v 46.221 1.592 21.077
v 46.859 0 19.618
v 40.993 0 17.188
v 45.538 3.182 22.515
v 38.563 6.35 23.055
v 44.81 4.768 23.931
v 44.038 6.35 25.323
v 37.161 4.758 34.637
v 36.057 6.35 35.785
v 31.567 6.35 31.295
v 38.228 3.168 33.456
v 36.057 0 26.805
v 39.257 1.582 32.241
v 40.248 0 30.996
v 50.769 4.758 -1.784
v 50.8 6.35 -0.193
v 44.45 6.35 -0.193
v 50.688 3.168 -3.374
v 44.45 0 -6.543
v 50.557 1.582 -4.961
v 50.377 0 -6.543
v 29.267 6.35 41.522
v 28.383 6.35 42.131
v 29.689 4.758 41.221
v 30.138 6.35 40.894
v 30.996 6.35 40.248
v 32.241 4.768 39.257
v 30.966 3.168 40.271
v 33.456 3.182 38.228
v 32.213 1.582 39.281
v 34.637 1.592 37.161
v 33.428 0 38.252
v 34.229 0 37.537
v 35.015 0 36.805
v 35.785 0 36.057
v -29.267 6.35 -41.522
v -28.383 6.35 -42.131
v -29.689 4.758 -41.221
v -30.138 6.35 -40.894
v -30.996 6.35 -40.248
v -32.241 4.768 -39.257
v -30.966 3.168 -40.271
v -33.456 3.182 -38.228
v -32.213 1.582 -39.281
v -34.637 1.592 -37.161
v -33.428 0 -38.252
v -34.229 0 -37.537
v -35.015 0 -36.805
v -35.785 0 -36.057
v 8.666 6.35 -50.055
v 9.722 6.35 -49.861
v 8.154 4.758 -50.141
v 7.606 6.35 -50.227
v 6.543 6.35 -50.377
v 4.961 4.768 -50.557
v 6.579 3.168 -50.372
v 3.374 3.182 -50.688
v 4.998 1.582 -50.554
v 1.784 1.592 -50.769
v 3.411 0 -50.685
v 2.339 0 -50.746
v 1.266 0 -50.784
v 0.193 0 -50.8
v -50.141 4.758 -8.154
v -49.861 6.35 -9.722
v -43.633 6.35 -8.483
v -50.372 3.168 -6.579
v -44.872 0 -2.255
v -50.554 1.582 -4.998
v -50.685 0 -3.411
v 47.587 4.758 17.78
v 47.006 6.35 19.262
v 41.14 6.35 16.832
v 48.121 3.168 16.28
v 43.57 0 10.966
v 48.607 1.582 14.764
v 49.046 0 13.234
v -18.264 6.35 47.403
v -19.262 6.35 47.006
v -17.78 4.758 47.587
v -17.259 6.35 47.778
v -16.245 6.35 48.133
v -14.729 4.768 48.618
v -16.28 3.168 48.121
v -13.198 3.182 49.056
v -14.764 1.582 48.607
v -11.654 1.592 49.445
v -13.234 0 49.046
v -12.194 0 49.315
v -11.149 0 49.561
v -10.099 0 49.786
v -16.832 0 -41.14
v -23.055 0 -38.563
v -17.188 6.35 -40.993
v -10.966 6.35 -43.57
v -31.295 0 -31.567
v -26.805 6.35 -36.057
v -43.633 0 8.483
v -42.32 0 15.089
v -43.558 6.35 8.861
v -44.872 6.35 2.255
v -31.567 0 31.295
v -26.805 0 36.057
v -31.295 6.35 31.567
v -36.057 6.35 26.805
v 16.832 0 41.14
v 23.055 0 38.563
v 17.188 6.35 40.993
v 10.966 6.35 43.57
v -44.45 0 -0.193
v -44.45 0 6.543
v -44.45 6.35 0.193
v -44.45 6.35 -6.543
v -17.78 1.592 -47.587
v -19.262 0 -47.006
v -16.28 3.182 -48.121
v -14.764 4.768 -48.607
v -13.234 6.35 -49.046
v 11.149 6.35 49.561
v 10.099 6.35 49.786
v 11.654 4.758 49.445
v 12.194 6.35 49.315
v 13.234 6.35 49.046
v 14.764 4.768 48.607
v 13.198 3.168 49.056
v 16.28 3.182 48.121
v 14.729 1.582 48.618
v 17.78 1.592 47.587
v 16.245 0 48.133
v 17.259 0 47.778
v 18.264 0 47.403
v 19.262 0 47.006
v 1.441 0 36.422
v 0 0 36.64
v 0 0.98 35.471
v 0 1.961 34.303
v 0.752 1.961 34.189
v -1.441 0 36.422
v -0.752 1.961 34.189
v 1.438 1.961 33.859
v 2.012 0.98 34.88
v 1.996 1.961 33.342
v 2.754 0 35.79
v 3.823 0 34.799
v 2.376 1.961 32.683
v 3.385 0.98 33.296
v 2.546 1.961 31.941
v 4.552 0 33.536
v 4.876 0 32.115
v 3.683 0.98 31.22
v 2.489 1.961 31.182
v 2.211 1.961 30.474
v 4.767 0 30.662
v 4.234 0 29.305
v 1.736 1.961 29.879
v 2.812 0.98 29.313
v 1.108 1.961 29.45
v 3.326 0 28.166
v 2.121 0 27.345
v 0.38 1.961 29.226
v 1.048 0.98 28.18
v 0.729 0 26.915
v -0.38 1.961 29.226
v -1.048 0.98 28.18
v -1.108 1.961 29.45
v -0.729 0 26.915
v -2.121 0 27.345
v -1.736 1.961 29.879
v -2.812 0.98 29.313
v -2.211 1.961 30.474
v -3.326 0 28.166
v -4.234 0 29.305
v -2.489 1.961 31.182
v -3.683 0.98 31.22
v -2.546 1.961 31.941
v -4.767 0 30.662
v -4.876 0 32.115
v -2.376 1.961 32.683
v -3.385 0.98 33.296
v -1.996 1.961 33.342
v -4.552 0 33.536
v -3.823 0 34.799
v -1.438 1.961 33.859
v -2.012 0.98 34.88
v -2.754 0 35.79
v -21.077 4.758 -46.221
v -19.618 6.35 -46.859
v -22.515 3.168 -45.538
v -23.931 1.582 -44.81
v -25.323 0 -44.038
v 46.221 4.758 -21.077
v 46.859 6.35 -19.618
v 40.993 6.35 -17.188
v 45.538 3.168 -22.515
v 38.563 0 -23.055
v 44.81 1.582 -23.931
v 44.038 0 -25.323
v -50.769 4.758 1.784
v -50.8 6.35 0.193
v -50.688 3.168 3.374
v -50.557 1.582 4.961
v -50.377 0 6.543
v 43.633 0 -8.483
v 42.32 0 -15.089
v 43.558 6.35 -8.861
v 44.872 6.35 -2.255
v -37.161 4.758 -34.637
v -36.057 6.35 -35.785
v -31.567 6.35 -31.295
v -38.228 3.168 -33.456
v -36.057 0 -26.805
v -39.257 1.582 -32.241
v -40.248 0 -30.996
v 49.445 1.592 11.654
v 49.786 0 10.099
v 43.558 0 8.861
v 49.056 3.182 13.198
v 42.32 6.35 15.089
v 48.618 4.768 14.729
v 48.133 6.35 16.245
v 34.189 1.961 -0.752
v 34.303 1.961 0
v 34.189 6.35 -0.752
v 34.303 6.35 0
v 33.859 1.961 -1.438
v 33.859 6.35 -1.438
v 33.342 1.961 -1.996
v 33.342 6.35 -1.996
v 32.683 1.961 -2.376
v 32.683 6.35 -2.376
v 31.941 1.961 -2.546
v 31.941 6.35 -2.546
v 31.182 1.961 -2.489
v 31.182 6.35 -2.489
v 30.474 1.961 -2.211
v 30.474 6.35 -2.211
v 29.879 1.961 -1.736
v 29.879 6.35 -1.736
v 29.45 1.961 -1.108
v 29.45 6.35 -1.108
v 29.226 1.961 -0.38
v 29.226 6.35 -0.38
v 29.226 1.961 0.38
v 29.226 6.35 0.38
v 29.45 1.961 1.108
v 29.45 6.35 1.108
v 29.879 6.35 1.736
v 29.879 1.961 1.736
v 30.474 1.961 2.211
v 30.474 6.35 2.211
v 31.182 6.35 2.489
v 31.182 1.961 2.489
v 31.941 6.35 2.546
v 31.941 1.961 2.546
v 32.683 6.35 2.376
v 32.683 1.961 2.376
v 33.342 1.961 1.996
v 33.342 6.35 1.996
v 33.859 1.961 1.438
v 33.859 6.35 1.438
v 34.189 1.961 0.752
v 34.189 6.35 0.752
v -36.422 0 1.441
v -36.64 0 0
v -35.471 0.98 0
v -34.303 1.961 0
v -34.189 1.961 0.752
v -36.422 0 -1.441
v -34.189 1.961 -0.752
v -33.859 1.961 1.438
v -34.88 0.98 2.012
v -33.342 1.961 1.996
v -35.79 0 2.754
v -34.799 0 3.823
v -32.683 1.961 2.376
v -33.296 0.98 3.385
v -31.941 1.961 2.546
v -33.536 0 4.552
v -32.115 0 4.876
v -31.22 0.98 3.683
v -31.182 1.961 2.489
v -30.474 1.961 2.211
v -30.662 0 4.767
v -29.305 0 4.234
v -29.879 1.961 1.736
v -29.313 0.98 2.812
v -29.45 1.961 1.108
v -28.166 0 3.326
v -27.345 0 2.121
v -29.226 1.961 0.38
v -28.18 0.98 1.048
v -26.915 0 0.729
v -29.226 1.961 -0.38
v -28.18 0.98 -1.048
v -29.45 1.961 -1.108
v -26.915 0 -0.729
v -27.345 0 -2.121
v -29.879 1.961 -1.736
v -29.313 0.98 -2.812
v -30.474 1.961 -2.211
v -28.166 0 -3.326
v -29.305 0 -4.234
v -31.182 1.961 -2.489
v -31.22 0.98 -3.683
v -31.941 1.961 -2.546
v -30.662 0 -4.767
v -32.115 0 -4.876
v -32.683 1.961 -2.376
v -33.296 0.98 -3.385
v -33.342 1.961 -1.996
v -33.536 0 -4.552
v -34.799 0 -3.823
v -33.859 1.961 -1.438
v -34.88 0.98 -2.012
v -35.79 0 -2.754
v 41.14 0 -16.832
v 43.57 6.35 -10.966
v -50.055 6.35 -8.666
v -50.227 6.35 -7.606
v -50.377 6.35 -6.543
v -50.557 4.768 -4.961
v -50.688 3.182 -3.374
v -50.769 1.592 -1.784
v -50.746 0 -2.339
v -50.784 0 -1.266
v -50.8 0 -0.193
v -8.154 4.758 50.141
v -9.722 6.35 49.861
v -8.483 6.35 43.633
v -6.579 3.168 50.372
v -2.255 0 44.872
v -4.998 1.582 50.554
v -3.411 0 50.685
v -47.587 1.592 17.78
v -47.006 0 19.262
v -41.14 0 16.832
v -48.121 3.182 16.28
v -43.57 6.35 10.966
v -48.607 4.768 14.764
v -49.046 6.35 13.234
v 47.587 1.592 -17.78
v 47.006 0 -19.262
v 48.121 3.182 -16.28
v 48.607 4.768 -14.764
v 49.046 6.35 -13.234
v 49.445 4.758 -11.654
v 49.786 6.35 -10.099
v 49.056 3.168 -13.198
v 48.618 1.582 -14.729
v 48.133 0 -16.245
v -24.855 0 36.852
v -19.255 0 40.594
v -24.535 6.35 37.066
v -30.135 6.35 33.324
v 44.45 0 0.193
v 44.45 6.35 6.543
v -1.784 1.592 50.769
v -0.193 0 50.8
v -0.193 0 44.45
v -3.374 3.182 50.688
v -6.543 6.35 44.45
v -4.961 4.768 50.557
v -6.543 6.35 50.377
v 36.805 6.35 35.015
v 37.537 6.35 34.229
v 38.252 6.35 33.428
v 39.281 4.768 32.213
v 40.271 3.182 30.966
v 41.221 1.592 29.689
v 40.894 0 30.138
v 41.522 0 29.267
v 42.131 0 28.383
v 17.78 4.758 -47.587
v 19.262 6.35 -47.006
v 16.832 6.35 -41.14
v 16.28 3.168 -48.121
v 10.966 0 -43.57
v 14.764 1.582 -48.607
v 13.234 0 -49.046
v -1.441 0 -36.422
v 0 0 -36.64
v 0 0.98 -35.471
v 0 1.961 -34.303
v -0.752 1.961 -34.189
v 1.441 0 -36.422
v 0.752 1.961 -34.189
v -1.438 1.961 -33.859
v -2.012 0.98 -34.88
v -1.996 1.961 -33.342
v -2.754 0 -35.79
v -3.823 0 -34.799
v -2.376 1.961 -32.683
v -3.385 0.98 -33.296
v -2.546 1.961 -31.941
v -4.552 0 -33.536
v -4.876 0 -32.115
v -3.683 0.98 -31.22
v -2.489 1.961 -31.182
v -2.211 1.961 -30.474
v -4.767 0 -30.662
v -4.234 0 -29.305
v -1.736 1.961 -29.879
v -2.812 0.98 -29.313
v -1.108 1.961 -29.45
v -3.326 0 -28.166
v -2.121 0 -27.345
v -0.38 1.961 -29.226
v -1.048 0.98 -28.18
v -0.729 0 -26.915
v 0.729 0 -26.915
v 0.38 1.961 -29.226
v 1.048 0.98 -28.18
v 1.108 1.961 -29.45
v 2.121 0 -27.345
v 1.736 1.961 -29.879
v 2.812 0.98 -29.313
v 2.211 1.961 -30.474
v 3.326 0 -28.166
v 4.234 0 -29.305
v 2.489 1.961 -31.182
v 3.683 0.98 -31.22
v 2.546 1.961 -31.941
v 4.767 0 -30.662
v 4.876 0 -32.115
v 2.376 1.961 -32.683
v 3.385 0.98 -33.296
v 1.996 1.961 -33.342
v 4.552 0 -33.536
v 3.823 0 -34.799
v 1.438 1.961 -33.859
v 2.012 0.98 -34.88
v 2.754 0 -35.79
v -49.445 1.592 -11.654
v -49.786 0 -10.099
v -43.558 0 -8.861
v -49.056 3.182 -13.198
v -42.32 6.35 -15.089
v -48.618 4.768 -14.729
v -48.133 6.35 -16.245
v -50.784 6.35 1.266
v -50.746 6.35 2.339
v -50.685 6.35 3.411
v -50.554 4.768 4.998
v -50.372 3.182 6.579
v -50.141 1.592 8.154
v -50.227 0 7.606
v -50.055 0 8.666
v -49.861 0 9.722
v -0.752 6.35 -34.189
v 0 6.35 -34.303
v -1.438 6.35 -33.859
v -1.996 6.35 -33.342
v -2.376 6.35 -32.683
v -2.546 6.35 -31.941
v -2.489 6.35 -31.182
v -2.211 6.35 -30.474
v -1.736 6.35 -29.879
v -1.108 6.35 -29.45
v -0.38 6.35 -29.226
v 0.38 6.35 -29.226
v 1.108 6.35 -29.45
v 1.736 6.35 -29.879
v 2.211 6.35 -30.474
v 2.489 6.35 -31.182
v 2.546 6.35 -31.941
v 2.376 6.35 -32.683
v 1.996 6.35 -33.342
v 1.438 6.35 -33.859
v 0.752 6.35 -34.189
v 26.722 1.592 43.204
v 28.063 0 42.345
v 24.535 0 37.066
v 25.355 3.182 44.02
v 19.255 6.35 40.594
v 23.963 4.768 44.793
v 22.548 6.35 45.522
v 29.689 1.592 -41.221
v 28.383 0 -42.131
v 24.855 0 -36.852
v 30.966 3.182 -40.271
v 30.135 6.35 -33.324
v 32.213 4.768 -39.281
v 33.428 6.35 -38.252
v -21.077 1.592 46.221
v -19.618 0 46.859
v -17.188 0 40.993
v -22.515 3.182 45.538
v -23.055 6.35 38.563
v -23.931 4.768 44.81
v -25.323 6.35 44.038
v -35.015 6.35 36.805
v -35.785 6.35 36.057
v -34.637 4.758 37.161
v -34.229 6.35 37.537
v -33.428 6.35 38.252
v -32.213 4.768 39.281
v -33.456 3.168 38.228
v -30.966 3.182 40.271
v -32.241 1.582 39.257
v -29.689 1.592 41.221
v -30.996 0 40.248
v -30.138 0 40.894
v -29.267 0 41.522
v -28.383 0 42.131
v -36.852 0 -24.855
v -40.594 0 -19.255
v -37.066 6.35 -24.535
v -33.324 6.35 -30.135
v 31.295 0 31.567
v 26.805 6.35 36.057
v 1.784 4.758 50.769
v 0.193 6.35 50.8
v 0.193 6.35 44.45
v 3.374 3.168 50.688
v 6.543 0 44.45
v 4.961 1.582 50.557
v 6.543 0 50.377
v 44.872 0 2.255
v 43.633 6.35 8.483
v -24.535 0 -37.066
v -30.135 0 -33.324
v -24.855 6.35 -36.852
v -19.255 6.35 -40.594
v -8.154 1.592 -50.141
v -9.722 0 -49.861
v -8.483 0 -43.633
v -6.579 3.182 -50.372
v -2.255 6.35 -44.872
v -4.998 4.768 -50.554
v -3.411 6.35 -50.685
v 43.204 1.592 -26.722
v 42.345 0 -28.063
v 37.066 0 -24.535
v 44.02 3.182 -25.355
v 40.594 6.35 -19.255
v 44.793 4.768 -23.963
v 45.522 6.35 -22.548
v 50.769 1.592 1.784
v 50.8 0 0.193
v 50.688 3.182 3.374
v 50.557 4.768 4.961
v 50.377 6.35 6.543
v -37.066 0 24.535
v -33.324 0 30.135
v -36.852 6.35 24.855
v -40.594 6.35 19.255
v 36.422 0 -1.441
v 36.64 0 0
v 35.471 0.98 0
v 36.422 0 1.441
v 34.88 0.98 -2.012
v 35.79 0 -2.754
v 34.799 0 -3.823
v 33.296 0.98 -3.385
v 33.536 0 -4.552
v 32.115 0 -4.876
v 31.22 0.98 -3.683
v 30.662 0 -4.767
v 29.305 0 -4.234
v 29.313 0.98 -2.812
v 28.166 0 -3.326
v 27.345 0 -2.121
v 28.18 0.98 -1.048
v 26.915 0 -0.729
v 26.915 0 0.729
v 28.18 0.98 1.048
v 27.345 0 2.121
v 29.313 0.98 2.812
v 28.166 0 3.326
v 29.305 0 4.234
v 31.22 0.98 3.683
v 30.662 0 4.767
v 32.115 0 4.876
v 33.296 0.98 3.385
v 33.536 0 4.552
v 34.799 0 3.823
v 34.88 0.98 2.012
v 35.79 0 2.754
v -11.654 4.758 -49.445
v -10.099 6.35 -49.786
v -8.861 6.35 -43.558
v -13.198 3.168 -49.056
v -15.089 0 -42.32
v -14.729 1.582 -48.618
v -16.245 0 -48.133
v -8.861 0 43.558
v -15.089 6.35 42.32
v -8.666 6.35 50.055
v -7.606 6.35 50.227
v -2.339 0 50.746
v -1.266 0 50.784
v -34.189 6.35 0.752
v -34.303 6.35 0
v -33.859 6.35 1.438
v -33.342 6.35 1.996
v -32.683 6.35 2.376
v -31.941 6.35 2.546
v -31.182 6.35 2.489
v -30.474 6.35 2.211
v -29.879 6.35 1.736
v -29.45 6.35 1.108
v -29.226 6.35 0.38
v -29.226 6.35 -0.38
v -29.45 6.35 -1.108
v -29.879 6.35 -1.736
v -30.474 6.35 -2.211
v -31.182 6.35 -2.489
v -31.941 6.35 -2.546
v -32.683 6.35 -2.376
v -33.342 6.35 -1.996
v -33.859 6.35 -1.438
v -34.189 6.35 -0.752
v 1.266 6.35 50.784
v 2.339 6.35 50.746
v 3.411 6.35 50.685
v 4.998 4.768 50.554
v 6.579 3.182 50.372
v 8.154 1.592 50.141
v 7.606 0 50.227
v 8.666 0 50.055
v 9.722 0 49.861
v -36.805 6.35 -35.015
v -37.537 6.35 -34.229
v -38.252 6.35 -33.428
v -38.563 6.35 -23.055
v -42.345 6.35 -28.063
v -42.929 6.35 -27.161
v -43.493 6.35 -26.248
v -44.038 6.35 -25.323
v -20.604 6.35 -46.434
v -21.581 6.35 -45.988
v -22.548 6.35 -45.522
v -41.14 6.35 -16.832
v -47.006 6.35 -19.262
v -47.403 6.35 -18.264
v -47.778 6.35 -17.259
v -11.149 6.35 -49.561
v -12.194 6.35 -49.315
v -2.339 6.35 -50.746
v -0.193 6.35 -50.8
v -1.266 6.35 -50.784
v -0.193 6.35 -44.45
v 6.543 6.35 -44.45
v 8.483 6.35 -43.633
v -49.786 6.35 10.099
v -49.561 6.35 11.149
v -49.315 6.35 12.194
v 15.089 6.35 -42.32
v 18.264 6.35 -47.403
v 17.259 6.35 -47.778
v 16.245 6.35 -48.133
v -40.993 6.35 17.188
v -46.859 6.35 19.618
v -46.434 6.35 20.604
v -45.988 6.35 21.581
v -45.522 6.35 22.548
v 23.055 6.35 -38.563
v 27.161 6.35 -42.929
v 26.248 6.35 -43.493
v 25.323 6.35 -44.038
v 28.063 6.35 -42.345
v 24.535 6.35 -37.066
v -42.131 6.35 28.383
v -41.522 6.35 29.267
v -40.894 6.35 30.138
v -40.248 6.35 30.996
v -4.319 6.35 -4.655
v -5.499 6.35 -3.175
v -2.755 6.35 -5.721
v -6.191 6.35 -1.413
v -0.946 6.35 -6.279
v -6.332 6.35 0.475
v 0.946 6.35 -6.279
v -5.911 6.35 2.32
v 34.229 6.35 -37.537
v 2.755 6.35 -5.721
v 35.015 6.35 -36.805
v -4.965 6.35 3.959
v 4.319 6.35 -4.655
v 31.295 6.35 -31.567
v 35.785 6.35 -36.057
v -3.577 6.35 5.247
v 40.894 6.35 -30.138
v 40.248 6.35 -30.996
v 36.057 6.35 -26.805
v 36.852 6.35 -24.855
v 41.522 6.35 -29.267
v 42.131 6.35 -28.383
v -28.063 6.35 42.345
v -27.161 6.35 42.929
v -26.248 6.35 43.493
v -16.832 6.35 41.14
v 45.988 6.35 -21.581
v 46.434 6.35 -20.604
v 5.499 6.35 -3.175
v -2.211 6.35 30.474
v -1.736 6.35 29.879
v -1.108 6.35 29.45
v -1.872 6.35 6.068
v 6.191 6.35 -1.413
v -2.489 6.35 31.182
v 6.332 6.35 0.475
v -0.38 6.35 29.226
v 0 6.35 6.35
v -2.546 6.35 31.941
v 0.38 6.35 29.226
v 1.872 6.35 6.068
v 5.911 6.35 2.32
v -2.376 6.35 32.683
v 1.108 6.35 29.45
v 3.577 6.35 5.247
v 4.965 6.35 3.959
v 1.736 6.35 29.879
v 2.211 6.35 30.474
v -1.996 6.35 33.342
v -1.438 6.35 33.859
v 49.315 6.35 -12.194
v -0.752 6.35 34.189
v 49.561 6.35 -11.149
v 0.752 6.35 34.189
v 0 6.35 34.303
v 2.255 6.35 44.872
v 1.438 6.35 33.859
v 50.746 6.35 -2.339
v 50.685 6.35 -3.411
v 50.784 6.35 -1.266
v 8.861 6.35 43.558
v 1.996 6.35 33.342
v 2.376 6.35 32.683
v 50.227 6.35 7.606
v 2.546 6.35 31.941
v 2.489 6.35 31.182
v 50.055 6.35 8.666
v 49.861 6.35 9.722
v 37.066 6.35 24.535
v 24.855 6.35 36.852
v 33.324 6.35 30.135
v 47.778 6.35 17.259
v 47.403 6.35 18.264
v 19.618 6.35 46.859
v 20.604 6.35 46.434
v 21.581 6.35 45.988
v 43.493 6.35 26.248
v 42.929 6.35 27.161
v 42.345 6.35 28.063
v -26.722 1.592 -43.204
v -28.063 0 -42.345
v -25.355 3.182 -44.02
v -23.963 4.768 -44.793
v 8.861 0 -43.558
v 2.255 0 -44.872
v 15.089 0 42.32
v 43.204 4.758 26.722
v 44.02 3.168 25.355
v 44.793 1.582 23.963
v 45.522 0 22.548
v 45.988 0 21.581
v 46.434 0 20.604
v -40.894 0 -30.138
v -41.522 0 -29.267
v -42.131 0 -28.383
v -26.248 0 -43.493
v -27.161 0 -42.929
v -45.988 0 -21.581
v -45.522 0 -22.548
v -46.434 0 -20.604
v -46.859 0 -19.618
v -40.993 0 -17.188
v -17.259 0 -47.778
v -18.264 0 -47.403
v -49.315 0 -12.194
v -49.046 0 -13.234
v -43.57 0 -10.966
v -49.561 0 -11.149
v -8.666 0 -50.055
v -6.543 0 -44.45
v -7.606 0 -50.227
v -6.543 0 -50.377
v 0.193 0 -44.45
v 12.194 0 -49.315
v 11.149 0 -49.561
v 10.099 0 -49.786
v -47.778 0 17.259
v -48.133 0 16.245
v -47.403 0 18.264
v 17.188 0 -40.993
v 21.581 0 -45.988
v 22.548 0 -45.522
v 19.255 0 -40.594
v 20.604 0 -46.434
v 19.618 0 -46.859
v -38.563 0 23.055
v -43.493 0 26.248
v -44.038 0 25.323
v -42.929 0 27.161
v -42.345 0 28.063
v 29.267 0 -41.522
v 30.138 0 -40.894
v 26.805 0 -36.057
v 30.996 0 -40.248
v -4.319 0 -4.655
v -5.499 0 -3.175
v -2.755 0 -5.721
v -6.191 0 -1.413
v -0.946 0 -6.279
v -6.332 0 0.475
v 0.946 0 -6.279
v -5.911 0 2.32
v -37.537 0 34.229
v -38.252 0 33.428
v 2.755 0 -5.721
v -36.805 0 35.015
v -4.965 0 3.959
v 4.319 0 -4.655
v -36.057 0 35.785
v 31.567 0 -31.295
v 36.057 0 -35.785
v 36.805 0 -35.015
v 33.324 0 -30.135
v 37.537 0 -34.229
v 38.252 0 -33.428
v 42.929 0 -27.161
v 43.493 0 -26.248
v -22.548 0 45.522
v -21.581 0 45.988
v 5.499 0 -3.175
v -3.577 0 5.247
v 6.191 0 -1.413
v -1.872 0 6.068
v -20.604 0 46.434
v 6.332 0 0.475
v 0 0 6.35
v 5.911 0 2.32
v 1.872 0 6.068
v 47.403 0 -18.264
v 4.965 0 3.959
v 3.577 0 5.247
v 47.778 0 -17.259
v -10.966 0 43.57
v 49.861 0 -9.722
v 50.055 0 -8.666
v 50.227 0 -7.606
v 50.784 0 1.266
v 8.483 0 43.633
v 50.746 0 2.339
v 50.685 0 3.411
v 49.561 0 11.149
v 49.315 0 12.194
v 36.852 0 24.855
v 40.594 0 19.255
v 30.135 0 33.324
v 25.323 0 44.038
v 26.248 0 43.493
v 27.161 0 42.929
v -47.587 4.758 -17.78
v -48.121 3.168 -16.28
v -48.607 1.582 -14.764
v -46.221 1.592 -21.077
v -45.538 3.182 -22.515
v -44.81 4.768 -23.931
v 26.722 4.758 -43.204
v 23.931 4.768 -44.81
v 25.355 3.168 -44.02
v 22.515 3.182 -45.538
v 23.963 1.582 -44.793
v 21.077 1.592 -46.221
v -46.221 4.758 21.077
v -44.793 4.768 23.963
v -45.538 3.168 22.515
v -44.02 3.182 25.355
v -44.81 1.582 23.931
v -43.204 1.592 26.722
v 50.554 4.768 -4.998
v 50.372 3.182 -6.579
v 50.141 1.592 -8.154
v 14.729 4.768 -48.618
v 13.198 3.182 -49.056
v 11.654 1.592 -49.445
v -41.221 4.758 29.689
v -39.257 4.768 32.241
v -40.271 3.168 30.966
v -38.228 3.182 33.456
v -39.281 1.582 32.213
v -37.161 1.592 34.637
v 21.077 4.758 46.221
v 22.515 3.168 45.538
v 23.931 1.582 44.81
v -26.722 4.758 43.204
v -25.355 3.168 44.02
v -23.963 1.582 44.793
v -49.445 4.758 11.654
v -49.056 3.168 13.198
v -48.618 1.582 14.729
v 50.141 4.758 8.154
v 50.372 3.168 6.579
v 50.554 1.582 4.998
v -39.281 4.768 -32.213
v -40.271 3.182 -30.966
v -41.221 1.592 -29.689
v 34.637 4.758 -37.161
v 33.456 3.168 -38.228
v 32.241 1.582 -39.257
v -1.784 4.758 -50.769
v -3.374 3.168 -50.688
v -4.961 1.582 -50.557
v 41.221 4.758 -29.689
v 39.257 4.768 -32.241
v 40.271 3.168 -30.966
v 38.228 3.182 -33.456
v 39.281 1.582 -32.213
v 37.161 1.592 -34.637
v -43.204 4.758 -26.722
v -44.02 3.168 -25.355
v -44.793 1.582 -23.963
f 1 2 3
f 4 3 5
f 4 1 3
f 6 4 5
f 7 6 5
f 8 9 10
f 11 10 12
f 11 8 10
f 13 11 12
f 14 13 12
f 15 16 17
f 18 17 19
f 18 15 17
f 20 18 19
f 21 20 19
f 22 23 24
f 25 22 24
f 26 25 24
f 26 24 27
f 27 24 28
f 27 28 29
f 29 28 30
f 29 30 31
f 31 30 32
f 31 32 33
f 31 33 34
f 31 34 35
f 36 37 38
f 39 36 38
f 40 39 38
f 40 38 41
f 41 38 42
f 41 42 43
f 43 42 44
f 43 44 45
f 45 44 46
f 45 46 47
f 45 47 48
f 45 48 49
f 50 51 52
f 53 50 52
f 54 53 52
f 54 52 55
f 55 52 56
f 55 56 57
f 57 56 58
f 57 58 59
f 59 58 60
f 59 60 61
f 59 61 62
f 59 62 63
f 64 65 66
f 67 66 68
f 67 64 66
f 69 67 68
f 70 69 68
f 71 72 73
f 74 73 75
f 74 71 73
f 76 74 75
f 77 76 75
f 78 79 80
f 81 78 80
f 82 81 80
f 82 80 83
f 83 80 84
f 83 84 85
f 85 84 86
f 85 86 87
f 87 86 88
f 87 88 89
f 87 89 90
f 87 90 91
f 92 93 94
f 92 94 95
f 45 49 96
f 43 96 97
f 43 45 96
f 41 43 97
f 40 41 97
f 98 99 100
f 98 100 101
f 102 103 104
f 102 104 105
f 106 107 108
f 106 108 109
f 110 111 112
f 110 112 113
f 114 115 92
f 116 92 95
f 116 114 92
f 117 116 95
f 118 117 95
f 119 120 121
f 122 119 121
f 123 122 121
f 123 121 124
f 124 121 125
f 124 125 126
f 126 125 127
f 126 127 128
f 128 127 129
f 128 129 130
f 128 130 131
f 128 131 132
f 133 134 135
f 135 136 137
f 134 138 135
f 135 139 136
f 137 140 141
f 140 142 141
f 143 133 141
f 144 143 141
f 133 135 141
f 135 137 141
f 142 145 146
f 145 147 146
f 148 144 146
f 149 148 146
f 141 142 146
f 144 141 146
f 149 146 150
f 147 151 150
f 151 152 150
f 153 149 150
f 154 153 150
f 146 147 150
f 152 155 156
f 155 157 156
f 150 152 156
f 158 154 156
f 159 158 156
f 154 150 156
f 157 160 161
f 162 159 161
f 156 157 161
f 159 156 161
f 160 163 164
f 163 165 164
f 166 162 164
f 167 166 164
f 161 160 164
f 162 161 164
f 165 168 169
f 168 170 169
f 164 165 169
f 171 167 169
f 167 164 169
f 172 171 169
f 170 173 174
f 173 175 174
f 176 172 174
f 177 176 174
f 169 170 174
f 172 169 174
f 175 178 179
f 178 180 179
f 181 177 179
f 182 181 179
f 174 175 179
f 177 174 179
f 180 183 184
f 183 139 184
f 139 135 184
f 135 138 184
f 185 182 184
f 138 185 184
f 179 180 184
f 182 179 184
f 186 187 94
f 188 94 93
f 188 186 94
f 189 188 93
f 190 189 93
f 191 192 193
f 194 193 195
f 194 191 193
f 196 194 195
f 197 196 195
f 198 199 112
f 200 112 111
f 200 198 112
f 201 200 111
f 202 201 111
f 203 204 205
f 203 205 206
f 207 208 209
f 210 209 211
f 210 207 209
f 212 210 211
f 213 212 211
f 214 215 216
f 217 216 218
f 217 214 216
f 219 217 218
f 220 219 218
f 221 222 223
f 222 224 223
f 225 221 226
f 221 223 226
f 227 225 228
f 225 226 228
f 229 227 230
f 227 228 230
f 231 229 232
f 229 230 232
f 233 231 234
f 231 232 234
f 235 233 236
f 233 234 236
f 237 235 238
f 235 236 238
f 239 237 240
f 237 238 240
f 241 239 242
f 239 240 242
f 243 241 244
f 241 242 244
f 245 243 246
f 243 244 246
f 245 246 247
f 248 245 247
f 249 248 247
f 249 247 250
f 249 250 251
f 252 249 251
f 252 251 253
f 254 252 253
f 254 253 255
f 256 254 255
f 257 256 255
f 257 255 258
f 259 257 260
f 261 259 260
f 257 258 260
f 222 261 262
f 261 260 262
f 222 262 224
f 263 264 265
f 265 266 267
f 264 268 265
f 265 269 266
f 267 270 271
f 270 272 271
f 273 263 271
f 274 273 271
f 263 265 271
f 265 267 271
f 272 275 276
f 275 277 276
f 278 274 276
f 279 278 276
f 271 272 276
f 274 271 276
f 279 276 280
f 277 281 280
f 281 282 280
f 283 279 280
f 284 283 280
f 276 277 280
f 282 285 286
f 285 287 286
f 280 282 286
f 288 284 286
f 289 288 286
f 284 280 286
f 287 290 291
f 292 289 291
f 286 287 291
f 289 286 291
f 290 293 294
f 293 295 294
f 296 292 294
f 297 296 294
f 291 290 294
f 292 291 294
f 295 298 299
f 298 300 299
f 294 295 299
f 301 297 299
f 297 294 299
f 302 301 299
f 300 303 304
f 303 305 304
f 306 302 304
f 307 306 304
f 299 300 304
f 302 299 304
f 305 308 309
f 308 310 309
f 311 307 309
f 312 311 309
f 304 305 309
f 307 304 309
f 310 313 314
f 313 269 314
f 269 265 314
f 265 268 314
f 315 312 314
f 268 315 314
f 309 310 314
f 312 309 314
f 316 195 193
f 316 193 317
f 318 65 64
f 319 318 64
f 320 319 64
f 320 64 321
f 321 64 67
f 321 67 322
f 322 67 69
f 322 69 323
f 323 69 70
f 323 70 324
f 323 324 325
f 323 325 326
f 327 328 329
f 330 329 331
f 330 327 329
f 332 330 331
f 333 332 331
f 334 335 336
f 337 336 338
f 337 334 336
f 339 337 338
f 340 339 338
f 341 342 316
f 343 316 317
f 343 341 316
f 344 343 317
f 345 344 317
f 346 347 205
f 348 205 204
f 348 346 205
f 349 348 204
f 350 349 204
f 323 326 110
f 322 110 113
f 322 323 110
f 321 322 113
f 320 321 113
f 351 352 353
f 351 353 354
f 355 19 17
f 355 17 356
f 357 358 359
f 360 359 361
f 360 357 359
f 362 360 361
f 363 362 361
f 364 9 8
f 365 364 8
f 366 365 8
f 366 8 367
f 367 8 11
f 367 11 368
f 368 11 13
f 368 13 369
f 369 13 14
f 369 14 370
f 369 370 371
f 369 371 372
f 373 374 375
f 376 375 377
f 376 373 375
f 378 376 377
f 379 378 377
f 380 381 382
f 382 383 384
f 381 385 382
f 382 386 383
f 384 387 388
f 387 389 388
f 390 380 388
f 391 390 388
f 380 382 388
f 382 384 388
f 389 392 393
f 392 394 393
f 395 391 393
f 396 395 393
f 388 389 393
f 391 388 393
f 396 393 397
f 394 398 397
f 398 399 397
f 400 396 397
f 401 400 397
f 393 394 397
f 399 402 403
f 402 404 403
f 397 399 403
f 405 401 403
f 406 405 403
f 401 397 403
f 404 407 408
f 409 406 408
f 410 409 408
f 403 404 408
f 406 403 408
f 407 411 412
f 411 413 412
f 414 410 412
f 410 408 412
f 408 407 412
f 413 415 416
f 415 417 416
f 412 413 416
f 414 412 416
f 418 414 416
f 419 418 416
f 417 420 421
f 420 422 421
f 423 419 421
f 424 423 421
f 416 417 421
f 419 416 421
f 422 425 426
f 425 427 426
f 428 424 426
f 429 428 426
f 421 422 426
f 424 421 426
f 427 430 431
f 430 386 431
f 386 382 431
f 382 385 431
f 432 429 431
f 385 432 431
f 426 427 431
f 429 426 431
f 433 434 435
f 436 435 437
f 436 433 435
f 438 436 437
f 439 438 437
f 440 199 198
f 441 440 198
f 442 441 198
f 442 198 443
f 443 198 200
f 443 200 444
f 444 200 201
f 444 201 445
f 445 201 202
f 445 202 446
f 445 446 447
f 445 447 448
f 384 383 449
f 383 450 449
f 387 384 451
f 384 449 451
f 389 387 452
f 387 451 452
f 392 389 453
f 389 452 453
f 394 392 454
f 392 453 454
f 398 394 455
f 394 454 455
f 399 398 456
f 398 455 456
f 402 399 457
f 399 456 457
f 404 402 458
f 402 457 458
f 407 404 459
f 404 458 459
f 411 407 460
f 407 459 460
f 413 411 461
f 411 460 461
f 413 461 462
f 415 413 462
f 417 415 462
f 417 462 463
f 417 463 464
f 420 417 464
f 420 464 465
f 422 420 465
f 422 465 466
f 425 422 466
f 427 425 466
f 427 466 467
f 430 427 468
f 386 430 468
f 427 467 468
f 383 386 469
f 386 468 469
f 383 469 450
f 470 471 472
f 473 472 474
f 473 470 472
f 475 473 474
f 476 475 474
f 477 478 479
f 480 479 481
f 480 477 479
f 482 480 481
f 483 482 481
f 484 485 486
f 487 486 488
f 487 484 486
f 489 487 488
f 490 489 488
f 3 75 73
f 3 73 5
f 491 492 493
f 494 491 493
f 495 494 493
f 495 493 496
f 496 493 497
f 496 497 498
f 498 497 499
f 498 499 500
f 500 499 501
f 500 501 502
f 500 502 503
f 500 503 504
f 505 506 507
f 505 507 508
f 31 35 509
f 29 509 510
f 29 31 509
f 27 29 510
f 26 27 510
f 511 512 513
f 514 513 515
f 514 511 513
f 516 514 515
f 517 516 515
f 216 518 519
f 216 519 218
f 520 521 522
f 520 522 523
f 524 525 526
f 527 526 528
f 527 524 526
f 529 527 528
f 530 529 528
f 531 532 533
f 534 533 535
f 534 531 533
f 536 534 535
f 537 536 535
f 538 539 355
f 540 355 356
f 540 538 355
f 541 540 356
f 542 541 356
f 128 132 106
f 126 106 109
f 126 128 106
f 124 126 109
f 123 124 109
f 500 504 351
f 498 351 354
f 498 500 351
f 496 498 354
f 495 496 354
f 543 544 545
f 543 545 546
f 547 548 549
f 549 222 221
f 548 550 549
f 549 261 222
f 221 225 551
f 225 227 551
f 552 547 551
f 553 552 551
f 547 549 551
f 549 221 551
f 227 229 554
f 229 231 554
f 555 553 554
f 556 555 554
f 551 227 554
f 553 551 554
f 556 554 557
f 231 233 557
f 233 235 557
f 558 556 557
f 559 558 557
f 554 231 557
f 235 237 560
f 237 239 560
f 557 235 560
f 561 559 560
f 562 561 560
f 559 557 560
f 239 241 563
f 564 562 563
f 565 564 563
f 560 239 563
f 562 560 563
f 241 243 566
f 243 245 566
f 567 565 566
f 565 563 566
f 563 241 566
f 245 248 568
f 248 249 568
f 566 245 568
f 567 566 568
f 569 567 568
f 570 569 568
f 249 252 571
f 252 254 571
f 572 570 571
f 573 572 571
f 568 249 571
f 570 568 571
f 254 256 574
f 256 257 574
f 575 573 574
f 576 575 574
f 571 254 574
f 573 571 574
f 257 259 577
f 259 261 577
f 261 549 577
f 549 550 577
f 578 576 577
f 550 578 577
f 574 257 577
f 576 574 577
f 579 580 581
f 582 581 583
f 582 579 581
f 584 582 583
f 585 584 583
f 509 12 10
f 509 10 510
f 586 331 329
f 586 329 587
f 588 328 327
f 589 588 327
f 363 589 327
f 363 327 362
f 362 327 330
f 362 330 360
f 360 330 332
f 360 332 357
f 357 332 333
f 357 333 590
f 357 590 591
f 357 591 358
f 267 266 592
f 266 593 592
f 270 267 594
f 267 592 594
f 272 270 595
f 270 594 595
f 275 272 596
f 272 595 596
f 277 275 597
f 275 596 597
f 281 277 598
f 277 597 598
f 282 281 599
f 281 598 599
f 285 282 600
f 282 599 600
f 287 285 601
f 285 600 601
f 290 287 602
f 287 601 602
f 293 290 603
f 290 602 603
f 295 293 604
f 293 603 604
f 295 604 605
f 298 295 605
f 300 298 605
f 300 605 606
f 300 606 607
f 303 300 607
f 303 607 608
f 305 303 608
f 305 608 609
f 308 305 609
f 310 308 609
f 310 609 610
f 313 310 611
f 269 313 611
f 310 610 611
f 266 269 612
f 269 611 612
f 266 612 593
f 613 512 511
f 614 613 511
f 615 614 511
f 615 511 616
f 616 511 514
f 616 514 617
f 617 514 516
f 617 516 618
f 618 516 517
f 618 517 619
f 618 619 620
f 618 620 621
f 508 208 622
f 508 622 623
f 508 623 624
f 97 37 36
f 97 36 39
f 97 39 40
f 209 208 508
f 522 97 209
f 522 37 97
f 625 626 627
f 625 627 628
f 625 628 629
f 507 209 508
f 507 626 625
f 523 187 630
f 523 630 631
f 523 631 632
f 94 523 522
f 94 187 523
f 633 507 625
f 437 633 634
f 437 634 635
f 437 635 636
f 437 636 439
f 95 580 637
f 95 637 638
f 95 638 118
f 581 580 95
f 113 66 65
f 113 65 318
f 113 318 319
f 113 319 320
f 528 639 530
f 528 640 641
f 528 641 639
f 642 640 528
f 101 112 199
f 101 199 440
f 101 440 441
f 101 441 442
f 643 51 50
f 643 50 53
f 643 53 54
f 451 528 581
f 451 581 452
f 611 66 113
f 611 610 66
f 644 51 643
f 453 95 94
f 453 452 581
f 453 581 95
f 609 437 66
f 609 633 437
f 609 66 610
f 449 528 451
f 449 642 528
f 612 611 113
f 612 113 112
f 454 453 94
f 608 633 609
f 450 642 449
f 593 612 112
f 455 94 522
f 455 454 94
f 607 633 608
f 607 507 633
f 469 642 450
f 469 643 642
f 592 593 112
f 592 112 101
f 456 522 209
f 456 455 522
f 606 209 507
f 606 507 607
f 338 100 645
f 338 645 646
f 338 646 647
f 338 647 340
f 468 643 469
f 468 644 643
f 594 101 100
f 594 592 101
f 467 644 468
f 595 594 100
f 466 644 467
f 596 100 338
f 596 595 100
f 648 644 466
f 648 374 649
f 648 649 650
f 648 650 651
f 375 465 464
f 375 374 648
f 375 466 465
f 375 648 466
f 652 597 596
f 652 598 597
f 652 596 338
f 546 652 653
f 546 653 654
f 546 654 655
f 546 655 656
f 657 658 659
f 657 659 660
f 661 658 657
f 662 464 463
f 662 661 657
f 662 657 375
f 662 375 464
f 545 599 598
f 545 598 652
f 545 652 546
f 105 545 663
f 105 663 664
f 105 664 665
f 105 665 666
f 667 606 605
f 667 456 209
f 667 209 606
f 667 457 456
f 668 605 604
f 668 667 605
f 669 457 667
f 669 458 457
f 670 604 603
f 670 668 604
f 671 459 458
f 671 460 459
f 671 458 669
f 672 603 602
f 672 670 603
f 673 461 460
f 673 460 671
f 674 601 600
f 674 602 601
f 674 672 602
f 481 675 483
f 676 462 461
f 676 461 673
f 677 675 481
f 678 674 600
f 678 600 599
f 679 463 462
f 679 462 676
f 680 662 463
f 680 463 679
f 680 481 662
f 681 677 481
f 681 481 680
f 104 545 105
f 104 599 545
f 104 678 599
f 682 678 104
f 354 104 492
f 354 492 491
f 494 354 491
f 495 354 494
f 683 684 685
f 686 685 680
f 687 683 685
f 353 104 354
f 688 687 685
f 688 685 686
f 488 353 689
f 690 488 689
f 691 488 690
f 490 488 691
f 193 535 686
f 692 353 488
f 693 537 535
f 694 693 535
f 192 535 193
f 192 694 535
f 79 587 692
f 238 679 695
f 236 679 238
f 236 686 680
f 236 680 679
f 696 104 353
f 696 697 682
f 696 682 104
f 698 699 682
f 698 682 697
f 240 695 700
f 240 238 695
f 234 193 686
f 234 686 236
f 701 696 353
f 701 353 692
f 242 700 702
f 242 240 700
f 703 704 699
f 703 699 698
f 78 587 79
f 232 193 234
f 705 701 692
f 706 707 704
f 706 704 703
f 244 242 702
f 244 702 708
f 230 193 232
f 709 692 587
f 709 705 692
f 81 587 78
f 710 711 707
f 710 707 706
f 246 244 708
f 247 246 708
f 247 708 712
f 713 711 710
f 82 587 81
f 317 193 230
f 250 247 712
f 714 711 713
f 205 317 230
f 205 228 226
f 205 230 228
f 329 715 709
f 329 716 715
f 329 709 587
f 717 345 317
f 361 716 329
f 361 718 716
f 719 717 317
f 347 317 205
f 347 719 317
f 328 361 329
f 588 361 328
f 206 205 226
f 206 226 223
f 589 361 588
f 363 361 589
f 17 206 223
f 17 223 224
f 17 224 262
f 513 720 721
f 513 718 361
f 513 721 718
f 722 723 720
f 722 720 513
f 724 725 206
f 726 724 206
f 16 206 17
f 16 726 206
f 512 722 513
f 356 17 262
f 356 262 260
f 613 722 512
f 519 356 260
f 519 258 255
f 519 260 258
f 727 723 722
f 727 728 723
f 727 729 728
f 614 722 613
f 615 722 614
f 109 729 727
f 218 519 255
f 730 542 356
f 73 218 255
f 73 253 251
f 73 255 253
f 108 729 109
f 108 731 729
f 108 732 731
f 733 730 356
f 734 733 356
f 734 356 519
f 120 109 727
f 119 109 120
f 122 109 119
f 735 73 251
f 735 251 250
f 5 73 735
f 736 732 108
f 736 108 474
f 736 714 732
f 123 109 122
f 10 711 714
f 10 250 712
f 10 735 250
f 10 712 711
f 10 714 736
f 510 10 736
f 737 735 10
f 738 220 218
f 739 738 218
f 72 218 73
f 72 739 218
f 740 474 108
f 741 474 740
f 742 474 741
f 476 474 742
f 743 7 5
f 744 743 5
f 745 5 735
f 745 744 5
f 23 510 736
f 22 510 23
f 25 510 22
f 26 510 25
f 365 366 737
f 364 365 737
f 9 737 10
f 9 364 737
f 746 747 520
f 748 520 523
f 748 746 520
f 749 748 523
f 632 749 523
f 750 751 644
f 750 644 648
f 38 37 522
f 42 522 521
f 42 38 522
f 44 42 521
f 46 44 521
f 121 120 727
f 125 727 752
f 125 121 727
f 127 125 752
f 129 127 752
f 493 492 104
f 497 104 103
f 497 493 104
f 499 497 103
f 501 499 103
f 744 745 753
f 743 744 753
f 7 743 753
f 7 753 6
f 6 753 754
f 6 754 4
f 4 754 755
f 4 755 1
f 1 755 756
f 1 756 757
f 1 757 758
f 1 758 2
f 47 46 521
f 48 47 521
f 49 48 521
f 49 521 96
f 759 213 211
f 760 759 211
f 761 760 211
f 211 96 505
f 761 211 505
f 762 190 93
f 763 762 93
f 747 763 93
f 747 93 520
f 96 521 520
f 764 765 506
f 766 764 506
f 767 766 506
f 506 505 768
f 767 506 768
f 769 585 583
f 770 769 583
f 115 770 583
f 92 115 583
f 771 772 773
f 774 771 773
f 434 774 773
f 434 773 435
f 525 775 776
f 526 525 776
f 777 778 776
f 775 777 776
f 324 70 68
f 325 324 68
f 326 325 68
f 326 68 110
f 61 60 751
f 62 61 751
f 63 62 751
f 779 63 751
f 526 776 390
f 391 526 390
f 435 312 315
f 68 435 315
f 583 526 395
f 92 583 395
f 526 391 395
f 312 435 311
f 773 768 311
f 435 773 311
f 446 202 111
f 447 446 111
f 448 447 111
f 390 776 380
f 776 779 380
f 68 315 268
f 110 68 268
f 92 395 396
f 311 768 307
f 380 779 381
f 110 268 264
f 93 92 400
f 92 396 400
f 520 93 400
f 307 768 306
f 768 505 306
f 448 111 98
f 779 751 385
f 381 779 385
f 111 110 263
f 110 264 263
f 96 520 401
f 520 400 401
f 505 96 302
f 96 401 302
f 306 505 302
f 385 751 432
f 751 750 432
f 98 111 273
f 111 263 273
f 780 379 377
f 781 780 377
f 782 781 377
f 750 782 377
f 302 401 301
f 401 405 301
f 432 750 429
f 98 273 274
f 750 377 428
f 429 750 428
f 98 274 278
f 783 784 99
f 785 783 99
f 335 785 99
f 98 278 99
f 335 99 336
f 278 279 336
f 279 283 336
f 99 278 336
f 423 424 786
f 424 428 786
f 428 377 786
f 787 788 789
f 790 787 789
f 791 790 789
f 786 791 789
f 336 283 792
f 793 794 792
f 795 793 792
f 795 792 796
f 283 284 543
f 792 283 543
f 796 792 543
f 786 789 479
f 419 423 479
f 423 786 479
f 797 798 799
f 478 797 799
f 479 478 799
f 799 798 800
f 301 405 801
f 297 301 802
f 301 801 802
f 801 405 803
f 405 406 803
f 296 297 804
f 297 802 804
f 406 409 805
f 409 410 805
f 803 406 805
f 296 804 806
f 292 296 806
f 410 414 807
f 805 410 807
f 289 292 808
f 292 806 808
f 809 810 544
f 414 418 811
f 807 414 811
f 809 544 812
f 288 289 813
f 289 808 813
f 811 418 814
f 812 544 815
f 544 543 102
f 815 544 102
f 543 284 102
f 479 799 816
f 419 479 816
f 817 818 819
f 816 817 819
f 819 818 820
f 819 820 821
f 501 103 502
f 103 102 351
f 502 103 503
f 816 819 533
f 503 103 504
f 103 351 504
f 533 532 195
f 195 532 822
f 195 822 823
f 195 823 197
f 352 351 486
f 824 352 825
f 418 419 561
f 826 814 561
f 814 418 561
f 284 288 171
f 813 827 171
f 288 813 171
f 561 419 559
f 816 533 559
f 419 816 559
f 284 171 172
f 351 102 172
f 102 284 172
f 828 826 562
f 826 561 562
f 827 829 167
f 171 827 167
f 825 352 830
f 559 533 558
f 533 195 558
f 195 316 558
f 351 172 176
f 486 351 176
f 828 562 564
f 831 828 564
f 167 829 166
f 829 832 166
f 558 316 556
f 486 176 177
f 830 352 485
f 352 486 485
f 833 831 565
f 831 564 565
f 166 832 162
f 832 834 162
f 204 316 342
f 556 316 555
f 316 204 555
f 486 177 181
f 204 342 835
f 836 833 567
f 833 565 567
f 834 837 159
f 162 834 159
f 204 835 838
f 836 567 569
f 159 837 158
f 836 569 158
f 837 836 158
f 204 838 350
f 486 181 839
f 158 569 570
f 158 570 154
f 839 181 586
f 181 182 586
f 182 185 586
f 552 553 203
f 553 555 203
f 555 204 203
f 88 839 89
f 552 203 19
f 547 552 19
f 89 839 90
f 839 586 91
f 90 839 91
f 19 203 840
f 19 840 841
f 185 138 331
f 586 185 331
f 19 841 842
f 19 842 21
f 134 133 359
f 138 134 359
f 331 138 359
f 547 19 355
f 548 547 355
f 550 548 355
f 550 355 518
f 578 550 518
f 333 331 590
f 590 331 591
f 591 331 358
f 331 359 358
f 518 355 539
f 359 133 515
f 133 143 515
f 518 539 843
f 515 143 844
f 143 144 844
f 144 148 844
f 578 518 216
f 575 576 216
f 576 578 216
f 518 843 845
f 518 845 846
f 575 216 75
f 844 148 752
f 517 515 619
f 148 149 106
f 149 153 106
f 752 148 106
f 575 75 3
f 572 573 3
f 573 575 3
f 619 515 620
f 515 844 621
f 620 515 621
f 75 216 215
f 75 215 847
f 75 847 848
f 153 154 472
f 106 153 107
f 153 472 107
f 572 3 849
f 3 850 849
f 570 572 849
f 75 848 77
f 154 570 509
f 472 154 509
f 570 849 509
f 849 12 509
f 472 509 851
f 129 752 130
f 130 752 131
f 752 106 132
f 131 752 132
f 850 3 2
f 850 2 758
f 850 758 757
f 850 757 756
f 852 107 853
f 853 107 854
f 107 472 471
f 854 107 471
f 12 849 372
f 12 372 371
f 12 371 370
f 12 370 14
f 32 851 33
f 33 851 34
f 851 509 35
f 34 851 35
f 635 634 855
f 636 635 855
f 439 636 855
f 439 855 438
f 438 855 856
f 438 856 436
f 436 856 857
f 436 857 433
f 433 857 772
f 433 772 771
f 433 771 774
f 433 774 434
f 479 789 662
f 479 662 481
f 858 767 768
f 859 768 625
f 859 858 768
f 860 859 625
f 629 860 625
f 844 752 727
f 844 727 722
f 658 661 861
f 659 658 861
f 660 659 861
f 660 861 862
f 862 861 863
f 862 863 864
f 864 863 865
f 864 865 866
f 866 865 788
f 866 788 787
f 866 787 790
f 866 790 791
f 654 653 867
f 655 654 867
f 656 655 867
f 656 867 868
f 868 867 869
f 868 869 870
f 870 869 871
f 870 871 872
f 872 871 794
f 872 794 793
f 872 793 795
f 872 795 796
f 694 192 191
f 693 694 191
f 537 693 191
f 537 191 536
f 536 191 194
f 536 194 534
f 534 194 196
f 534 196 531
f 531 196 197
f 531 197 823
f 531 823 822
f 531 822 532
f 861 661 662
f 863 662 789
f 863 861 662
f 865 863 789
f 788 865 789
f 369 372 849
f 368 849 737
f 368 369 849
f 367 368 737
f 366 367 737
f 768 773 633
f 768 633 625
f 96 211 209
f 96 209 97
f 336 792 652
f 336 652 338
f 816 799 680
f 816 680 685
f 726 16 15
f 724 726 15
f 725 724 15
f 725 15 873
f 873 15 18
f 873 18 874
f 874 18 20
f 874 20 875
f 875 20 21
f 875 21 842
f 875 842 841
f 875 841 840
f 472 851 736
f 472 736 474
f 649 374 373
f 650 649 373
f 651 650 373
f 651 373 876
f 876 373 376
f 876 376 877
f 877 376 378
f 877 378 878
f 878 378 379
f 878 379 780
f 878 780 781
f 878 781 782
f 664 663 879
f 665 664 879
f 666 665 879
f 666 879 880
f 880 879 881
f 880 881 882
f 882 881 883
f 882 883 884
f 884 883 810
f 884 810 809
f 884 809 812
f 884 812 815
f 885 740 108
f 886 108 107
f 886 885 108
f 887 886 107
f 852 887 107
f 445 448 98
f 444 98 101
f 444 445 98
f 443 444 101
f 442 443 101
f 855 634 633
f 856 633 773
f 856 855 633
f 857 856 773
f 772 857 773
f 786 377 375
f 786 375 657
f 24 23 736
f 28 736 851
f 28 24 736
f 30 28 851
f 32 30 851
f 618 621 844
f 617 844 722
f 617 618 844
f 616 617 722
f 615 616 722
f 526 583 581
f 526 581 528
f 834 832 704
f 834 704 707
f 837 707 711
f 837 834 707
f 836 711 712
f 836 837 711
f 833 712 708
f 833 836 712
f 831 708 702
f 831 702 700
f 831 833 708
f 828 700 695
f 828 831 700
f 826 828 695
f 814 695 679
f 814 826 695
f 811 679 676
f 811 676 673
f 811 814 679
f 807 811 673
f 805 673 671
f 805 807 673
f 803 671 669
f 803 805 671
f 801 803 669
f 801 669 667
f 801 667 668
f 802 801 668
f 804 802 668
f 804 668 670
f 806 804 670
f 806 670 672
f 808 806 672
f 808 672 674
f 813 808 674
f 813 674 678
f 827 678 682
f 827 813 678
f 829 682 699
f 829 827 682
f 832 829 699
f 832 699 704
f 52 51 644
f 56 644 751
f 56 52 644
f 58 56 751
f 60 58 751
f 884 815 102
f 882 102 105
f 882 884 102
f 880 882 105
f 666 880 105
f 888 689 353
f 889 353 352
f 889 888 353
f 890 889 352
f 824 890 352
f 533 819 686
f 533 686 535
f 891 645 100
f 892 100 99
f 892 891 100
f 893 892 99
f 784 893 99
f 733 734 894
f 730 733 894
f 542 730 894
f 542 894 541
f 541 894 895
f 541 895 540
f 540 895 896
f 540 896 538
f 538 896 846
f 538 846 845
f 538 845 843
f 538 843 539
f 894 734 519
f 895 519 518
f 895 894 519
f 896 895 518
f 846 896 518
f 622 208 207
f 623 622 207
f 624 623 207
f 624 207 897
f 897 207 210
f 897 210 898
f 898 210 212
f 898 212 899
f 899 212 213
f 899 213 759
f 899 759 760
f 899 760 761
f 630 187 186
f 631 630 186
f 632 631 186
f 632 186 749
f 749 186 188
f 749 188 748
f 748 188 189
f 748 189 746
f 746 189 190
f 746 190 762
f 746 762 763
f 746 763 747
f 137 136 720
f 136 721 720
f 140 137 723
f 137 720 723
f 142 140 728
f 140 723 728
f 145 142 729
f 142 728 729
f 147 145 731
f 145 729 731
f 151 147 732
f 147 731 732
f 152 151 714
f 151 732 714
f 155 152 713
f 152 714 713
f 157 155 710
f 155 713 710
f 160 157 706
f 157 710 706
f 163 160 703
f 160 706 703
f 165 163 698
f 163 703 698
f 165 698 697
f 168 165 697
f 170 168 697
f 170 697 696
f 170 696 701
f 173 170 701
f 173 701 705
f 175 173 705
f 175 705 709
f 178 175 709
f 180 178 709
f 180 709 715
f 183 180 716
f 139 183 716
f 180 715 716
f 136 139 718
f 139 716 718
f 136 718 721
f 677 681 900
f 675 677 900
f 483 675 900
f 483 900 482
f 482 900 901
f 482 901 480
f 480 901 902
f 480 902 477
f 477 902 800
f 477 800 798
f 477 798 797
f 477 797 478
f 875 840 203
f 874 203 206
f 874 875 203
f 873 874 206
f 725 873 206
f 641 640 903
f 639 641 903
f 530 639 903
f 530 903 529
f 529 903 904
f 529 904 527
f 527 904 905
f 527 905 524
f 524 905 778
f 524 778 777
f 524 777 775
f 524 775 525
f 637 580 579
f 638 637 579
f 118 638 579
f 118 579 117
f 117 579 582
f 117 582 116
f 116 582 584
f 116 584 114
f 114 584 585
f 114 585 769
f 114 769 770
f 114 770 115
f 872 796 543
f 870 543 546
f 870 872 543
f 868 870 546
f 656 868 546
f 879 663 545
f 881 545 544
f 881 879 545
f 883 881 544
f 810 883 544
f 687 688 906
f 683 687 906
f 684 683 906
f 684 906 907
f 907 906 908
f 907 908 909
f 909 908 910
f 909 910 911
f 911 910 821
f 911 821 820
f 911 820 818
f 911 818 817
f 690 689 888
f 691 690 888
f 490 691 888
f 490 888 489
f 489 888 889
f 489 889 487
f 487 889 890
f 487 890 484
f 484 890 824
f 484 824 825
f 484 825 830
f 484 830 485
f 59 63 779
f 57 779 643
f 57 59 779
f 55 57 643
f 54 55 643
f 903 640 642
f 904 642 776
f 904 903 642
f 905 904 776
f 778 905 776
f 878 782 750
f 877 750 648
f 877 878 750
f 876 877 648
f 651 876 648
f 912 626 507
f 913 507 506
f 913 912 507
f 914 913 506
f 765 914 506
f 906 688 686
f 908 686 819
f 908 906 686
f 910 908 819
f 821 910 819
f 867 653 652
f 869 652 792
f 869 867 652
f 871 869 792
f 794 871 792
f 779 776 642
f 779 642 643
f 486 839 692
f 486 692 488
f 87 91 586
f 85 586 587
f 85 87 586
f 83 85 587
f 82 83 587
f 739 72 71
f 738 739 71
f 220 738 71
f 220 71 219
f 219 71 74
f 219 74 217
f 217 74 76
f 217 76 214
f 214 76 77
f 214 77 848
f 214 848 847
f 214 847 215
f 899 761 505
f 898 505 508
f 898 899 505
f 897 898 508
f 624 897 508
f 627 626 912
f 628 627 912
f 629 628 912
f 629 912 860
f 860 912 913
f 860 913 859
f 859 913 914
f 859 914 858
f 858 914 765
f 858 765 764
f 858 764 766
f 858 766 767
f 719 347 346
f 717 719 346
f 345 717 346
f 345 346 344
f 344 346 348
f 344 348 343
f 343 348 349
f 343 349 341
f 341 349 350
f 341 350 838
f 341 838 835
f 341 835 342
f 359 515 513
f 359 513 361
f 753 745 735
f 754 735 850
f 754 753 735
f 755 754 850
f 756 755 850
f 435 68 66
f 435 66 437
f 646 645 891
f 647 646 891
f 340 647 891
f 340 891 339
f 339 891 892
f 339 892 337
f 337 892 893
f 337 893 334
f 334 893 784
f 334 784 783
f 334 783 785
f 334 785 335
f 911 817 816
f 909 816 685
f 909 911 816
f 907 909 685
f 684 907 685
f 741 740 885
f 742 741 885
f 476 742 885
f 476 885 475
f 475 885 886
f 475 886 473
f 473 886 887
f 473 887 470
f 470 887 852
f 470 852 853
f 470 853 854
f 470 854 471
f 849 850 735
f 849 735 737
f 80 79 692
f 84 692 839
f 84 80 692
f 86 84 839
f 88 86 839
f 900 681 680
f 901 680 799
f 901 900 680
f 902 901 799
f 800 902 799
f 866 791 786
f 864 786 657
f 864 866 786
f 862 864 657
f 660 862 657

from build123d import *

# Parameters (mm, degrees)
SKETCH1_R                                          = 50.8
SKETCH1_R_2                                        = 6.35
BOSS_EXTRUDE1_DEPTH                                = 6.35
CUT_EXTRUDE1_DEPTH                                 = 6.35
CIRPATTERN1_COUNT                                  = 32
CSK_FOR_10_FLAT_HEAD_MACHINE_SCREW_100_D           = 5.1054
CSK_FOR_10_FLAT_HEAD_MACHINE_SCREW_100_CSINK_D     = 9.779
CSK_FOR_10_FLAT_HEAD_MACHINE_SCREW_100_CSINK_ANGLE = 100
CIRPATTERN2_COUNT                                  = 4


with BuildPart() as part:
    # Sketch1 → Boss-Extrude1 (new body)
    with BuildSketch(Plane(origin=(0, 0, 0), x_dir=(1, 0, 0), z_dir=(0, 1, 0))):
        with Locations(Location((0, 0, 0), (0, 0, 270))):
            Circle(SKETCH1_R)
        with Locations(Location((0, 0, 0), (0, 0, 270))):
            Circle(SKETCH1_R_2, mode=Mode.SUBTRACT)
    extrude(amount=BOSS_EXTRUDE1_DEPTH)

    # Sketch2 → Cut-Extrude1 (cut)
    with BuildSketch(Plane.XY.offset(50.8)):
        Polygon((-11.786586159, 18.329182204), (15.154182204, -8.611586159), (11.786586159, -11.979182204), (-15.154182204, 14.961586159), align=None)
    cut_extrude1 = extrude(amount=-CUT_EXTRUDE1_DEPTH, mode=Mode.SUBTRACT)

    # CirPattern1: Cut-Extrude1 ×32 about axis
    cirpattern1_axis = Axis((0, 0, 0), (0, 1, 0))
    for i in range(1, CIRPATTERN1_COUNT):
        add(cut_extrude1.rotate(cirpattern1_axis, i * 360 / CIRPATTERN1_COUNT), mode=Mode.SUBTRACT)

    # CSK for #10 Flat Head Machine Screw (100)1 (through all)
    with Locations(Plane(origin=(0, 0, 31.75), x_dir=(0, 0, -1), z_dir=(0, -1, 0))):
        with Locations((0, 0)):
            csk_for_10_flat_head_machine_screw_100 = CounterSinkHole(CSK_FOR_10_FLAT_HEAD_MACHINE_SCREW_100_D / 2, CSK_FOR_10_FLAT_HEAD_MACHINE_SCREW_100_CSINK_D / 2, counter_sink_angle=CSK_FOR_10_FLAT_HEAD_MACHINE_SCREW_100_CSINK_ANGLE)

    # CirPattern2: CSK for #10 Flat Head Machine Screw (100)1 ×4 about axis
    cirpattern2_axis = Axis((0, 0, 0), (0, 1, 0))
    for i in range(1, CIRPATTERN2_COUNT):
        add(csk_for_10_flat_head_machine_screw_100.rotate(cirpattern2_axis, i * 360 / CIRPATTERN2_COUNT), mode=Mode.SUBTRACT)


solid = part.part
